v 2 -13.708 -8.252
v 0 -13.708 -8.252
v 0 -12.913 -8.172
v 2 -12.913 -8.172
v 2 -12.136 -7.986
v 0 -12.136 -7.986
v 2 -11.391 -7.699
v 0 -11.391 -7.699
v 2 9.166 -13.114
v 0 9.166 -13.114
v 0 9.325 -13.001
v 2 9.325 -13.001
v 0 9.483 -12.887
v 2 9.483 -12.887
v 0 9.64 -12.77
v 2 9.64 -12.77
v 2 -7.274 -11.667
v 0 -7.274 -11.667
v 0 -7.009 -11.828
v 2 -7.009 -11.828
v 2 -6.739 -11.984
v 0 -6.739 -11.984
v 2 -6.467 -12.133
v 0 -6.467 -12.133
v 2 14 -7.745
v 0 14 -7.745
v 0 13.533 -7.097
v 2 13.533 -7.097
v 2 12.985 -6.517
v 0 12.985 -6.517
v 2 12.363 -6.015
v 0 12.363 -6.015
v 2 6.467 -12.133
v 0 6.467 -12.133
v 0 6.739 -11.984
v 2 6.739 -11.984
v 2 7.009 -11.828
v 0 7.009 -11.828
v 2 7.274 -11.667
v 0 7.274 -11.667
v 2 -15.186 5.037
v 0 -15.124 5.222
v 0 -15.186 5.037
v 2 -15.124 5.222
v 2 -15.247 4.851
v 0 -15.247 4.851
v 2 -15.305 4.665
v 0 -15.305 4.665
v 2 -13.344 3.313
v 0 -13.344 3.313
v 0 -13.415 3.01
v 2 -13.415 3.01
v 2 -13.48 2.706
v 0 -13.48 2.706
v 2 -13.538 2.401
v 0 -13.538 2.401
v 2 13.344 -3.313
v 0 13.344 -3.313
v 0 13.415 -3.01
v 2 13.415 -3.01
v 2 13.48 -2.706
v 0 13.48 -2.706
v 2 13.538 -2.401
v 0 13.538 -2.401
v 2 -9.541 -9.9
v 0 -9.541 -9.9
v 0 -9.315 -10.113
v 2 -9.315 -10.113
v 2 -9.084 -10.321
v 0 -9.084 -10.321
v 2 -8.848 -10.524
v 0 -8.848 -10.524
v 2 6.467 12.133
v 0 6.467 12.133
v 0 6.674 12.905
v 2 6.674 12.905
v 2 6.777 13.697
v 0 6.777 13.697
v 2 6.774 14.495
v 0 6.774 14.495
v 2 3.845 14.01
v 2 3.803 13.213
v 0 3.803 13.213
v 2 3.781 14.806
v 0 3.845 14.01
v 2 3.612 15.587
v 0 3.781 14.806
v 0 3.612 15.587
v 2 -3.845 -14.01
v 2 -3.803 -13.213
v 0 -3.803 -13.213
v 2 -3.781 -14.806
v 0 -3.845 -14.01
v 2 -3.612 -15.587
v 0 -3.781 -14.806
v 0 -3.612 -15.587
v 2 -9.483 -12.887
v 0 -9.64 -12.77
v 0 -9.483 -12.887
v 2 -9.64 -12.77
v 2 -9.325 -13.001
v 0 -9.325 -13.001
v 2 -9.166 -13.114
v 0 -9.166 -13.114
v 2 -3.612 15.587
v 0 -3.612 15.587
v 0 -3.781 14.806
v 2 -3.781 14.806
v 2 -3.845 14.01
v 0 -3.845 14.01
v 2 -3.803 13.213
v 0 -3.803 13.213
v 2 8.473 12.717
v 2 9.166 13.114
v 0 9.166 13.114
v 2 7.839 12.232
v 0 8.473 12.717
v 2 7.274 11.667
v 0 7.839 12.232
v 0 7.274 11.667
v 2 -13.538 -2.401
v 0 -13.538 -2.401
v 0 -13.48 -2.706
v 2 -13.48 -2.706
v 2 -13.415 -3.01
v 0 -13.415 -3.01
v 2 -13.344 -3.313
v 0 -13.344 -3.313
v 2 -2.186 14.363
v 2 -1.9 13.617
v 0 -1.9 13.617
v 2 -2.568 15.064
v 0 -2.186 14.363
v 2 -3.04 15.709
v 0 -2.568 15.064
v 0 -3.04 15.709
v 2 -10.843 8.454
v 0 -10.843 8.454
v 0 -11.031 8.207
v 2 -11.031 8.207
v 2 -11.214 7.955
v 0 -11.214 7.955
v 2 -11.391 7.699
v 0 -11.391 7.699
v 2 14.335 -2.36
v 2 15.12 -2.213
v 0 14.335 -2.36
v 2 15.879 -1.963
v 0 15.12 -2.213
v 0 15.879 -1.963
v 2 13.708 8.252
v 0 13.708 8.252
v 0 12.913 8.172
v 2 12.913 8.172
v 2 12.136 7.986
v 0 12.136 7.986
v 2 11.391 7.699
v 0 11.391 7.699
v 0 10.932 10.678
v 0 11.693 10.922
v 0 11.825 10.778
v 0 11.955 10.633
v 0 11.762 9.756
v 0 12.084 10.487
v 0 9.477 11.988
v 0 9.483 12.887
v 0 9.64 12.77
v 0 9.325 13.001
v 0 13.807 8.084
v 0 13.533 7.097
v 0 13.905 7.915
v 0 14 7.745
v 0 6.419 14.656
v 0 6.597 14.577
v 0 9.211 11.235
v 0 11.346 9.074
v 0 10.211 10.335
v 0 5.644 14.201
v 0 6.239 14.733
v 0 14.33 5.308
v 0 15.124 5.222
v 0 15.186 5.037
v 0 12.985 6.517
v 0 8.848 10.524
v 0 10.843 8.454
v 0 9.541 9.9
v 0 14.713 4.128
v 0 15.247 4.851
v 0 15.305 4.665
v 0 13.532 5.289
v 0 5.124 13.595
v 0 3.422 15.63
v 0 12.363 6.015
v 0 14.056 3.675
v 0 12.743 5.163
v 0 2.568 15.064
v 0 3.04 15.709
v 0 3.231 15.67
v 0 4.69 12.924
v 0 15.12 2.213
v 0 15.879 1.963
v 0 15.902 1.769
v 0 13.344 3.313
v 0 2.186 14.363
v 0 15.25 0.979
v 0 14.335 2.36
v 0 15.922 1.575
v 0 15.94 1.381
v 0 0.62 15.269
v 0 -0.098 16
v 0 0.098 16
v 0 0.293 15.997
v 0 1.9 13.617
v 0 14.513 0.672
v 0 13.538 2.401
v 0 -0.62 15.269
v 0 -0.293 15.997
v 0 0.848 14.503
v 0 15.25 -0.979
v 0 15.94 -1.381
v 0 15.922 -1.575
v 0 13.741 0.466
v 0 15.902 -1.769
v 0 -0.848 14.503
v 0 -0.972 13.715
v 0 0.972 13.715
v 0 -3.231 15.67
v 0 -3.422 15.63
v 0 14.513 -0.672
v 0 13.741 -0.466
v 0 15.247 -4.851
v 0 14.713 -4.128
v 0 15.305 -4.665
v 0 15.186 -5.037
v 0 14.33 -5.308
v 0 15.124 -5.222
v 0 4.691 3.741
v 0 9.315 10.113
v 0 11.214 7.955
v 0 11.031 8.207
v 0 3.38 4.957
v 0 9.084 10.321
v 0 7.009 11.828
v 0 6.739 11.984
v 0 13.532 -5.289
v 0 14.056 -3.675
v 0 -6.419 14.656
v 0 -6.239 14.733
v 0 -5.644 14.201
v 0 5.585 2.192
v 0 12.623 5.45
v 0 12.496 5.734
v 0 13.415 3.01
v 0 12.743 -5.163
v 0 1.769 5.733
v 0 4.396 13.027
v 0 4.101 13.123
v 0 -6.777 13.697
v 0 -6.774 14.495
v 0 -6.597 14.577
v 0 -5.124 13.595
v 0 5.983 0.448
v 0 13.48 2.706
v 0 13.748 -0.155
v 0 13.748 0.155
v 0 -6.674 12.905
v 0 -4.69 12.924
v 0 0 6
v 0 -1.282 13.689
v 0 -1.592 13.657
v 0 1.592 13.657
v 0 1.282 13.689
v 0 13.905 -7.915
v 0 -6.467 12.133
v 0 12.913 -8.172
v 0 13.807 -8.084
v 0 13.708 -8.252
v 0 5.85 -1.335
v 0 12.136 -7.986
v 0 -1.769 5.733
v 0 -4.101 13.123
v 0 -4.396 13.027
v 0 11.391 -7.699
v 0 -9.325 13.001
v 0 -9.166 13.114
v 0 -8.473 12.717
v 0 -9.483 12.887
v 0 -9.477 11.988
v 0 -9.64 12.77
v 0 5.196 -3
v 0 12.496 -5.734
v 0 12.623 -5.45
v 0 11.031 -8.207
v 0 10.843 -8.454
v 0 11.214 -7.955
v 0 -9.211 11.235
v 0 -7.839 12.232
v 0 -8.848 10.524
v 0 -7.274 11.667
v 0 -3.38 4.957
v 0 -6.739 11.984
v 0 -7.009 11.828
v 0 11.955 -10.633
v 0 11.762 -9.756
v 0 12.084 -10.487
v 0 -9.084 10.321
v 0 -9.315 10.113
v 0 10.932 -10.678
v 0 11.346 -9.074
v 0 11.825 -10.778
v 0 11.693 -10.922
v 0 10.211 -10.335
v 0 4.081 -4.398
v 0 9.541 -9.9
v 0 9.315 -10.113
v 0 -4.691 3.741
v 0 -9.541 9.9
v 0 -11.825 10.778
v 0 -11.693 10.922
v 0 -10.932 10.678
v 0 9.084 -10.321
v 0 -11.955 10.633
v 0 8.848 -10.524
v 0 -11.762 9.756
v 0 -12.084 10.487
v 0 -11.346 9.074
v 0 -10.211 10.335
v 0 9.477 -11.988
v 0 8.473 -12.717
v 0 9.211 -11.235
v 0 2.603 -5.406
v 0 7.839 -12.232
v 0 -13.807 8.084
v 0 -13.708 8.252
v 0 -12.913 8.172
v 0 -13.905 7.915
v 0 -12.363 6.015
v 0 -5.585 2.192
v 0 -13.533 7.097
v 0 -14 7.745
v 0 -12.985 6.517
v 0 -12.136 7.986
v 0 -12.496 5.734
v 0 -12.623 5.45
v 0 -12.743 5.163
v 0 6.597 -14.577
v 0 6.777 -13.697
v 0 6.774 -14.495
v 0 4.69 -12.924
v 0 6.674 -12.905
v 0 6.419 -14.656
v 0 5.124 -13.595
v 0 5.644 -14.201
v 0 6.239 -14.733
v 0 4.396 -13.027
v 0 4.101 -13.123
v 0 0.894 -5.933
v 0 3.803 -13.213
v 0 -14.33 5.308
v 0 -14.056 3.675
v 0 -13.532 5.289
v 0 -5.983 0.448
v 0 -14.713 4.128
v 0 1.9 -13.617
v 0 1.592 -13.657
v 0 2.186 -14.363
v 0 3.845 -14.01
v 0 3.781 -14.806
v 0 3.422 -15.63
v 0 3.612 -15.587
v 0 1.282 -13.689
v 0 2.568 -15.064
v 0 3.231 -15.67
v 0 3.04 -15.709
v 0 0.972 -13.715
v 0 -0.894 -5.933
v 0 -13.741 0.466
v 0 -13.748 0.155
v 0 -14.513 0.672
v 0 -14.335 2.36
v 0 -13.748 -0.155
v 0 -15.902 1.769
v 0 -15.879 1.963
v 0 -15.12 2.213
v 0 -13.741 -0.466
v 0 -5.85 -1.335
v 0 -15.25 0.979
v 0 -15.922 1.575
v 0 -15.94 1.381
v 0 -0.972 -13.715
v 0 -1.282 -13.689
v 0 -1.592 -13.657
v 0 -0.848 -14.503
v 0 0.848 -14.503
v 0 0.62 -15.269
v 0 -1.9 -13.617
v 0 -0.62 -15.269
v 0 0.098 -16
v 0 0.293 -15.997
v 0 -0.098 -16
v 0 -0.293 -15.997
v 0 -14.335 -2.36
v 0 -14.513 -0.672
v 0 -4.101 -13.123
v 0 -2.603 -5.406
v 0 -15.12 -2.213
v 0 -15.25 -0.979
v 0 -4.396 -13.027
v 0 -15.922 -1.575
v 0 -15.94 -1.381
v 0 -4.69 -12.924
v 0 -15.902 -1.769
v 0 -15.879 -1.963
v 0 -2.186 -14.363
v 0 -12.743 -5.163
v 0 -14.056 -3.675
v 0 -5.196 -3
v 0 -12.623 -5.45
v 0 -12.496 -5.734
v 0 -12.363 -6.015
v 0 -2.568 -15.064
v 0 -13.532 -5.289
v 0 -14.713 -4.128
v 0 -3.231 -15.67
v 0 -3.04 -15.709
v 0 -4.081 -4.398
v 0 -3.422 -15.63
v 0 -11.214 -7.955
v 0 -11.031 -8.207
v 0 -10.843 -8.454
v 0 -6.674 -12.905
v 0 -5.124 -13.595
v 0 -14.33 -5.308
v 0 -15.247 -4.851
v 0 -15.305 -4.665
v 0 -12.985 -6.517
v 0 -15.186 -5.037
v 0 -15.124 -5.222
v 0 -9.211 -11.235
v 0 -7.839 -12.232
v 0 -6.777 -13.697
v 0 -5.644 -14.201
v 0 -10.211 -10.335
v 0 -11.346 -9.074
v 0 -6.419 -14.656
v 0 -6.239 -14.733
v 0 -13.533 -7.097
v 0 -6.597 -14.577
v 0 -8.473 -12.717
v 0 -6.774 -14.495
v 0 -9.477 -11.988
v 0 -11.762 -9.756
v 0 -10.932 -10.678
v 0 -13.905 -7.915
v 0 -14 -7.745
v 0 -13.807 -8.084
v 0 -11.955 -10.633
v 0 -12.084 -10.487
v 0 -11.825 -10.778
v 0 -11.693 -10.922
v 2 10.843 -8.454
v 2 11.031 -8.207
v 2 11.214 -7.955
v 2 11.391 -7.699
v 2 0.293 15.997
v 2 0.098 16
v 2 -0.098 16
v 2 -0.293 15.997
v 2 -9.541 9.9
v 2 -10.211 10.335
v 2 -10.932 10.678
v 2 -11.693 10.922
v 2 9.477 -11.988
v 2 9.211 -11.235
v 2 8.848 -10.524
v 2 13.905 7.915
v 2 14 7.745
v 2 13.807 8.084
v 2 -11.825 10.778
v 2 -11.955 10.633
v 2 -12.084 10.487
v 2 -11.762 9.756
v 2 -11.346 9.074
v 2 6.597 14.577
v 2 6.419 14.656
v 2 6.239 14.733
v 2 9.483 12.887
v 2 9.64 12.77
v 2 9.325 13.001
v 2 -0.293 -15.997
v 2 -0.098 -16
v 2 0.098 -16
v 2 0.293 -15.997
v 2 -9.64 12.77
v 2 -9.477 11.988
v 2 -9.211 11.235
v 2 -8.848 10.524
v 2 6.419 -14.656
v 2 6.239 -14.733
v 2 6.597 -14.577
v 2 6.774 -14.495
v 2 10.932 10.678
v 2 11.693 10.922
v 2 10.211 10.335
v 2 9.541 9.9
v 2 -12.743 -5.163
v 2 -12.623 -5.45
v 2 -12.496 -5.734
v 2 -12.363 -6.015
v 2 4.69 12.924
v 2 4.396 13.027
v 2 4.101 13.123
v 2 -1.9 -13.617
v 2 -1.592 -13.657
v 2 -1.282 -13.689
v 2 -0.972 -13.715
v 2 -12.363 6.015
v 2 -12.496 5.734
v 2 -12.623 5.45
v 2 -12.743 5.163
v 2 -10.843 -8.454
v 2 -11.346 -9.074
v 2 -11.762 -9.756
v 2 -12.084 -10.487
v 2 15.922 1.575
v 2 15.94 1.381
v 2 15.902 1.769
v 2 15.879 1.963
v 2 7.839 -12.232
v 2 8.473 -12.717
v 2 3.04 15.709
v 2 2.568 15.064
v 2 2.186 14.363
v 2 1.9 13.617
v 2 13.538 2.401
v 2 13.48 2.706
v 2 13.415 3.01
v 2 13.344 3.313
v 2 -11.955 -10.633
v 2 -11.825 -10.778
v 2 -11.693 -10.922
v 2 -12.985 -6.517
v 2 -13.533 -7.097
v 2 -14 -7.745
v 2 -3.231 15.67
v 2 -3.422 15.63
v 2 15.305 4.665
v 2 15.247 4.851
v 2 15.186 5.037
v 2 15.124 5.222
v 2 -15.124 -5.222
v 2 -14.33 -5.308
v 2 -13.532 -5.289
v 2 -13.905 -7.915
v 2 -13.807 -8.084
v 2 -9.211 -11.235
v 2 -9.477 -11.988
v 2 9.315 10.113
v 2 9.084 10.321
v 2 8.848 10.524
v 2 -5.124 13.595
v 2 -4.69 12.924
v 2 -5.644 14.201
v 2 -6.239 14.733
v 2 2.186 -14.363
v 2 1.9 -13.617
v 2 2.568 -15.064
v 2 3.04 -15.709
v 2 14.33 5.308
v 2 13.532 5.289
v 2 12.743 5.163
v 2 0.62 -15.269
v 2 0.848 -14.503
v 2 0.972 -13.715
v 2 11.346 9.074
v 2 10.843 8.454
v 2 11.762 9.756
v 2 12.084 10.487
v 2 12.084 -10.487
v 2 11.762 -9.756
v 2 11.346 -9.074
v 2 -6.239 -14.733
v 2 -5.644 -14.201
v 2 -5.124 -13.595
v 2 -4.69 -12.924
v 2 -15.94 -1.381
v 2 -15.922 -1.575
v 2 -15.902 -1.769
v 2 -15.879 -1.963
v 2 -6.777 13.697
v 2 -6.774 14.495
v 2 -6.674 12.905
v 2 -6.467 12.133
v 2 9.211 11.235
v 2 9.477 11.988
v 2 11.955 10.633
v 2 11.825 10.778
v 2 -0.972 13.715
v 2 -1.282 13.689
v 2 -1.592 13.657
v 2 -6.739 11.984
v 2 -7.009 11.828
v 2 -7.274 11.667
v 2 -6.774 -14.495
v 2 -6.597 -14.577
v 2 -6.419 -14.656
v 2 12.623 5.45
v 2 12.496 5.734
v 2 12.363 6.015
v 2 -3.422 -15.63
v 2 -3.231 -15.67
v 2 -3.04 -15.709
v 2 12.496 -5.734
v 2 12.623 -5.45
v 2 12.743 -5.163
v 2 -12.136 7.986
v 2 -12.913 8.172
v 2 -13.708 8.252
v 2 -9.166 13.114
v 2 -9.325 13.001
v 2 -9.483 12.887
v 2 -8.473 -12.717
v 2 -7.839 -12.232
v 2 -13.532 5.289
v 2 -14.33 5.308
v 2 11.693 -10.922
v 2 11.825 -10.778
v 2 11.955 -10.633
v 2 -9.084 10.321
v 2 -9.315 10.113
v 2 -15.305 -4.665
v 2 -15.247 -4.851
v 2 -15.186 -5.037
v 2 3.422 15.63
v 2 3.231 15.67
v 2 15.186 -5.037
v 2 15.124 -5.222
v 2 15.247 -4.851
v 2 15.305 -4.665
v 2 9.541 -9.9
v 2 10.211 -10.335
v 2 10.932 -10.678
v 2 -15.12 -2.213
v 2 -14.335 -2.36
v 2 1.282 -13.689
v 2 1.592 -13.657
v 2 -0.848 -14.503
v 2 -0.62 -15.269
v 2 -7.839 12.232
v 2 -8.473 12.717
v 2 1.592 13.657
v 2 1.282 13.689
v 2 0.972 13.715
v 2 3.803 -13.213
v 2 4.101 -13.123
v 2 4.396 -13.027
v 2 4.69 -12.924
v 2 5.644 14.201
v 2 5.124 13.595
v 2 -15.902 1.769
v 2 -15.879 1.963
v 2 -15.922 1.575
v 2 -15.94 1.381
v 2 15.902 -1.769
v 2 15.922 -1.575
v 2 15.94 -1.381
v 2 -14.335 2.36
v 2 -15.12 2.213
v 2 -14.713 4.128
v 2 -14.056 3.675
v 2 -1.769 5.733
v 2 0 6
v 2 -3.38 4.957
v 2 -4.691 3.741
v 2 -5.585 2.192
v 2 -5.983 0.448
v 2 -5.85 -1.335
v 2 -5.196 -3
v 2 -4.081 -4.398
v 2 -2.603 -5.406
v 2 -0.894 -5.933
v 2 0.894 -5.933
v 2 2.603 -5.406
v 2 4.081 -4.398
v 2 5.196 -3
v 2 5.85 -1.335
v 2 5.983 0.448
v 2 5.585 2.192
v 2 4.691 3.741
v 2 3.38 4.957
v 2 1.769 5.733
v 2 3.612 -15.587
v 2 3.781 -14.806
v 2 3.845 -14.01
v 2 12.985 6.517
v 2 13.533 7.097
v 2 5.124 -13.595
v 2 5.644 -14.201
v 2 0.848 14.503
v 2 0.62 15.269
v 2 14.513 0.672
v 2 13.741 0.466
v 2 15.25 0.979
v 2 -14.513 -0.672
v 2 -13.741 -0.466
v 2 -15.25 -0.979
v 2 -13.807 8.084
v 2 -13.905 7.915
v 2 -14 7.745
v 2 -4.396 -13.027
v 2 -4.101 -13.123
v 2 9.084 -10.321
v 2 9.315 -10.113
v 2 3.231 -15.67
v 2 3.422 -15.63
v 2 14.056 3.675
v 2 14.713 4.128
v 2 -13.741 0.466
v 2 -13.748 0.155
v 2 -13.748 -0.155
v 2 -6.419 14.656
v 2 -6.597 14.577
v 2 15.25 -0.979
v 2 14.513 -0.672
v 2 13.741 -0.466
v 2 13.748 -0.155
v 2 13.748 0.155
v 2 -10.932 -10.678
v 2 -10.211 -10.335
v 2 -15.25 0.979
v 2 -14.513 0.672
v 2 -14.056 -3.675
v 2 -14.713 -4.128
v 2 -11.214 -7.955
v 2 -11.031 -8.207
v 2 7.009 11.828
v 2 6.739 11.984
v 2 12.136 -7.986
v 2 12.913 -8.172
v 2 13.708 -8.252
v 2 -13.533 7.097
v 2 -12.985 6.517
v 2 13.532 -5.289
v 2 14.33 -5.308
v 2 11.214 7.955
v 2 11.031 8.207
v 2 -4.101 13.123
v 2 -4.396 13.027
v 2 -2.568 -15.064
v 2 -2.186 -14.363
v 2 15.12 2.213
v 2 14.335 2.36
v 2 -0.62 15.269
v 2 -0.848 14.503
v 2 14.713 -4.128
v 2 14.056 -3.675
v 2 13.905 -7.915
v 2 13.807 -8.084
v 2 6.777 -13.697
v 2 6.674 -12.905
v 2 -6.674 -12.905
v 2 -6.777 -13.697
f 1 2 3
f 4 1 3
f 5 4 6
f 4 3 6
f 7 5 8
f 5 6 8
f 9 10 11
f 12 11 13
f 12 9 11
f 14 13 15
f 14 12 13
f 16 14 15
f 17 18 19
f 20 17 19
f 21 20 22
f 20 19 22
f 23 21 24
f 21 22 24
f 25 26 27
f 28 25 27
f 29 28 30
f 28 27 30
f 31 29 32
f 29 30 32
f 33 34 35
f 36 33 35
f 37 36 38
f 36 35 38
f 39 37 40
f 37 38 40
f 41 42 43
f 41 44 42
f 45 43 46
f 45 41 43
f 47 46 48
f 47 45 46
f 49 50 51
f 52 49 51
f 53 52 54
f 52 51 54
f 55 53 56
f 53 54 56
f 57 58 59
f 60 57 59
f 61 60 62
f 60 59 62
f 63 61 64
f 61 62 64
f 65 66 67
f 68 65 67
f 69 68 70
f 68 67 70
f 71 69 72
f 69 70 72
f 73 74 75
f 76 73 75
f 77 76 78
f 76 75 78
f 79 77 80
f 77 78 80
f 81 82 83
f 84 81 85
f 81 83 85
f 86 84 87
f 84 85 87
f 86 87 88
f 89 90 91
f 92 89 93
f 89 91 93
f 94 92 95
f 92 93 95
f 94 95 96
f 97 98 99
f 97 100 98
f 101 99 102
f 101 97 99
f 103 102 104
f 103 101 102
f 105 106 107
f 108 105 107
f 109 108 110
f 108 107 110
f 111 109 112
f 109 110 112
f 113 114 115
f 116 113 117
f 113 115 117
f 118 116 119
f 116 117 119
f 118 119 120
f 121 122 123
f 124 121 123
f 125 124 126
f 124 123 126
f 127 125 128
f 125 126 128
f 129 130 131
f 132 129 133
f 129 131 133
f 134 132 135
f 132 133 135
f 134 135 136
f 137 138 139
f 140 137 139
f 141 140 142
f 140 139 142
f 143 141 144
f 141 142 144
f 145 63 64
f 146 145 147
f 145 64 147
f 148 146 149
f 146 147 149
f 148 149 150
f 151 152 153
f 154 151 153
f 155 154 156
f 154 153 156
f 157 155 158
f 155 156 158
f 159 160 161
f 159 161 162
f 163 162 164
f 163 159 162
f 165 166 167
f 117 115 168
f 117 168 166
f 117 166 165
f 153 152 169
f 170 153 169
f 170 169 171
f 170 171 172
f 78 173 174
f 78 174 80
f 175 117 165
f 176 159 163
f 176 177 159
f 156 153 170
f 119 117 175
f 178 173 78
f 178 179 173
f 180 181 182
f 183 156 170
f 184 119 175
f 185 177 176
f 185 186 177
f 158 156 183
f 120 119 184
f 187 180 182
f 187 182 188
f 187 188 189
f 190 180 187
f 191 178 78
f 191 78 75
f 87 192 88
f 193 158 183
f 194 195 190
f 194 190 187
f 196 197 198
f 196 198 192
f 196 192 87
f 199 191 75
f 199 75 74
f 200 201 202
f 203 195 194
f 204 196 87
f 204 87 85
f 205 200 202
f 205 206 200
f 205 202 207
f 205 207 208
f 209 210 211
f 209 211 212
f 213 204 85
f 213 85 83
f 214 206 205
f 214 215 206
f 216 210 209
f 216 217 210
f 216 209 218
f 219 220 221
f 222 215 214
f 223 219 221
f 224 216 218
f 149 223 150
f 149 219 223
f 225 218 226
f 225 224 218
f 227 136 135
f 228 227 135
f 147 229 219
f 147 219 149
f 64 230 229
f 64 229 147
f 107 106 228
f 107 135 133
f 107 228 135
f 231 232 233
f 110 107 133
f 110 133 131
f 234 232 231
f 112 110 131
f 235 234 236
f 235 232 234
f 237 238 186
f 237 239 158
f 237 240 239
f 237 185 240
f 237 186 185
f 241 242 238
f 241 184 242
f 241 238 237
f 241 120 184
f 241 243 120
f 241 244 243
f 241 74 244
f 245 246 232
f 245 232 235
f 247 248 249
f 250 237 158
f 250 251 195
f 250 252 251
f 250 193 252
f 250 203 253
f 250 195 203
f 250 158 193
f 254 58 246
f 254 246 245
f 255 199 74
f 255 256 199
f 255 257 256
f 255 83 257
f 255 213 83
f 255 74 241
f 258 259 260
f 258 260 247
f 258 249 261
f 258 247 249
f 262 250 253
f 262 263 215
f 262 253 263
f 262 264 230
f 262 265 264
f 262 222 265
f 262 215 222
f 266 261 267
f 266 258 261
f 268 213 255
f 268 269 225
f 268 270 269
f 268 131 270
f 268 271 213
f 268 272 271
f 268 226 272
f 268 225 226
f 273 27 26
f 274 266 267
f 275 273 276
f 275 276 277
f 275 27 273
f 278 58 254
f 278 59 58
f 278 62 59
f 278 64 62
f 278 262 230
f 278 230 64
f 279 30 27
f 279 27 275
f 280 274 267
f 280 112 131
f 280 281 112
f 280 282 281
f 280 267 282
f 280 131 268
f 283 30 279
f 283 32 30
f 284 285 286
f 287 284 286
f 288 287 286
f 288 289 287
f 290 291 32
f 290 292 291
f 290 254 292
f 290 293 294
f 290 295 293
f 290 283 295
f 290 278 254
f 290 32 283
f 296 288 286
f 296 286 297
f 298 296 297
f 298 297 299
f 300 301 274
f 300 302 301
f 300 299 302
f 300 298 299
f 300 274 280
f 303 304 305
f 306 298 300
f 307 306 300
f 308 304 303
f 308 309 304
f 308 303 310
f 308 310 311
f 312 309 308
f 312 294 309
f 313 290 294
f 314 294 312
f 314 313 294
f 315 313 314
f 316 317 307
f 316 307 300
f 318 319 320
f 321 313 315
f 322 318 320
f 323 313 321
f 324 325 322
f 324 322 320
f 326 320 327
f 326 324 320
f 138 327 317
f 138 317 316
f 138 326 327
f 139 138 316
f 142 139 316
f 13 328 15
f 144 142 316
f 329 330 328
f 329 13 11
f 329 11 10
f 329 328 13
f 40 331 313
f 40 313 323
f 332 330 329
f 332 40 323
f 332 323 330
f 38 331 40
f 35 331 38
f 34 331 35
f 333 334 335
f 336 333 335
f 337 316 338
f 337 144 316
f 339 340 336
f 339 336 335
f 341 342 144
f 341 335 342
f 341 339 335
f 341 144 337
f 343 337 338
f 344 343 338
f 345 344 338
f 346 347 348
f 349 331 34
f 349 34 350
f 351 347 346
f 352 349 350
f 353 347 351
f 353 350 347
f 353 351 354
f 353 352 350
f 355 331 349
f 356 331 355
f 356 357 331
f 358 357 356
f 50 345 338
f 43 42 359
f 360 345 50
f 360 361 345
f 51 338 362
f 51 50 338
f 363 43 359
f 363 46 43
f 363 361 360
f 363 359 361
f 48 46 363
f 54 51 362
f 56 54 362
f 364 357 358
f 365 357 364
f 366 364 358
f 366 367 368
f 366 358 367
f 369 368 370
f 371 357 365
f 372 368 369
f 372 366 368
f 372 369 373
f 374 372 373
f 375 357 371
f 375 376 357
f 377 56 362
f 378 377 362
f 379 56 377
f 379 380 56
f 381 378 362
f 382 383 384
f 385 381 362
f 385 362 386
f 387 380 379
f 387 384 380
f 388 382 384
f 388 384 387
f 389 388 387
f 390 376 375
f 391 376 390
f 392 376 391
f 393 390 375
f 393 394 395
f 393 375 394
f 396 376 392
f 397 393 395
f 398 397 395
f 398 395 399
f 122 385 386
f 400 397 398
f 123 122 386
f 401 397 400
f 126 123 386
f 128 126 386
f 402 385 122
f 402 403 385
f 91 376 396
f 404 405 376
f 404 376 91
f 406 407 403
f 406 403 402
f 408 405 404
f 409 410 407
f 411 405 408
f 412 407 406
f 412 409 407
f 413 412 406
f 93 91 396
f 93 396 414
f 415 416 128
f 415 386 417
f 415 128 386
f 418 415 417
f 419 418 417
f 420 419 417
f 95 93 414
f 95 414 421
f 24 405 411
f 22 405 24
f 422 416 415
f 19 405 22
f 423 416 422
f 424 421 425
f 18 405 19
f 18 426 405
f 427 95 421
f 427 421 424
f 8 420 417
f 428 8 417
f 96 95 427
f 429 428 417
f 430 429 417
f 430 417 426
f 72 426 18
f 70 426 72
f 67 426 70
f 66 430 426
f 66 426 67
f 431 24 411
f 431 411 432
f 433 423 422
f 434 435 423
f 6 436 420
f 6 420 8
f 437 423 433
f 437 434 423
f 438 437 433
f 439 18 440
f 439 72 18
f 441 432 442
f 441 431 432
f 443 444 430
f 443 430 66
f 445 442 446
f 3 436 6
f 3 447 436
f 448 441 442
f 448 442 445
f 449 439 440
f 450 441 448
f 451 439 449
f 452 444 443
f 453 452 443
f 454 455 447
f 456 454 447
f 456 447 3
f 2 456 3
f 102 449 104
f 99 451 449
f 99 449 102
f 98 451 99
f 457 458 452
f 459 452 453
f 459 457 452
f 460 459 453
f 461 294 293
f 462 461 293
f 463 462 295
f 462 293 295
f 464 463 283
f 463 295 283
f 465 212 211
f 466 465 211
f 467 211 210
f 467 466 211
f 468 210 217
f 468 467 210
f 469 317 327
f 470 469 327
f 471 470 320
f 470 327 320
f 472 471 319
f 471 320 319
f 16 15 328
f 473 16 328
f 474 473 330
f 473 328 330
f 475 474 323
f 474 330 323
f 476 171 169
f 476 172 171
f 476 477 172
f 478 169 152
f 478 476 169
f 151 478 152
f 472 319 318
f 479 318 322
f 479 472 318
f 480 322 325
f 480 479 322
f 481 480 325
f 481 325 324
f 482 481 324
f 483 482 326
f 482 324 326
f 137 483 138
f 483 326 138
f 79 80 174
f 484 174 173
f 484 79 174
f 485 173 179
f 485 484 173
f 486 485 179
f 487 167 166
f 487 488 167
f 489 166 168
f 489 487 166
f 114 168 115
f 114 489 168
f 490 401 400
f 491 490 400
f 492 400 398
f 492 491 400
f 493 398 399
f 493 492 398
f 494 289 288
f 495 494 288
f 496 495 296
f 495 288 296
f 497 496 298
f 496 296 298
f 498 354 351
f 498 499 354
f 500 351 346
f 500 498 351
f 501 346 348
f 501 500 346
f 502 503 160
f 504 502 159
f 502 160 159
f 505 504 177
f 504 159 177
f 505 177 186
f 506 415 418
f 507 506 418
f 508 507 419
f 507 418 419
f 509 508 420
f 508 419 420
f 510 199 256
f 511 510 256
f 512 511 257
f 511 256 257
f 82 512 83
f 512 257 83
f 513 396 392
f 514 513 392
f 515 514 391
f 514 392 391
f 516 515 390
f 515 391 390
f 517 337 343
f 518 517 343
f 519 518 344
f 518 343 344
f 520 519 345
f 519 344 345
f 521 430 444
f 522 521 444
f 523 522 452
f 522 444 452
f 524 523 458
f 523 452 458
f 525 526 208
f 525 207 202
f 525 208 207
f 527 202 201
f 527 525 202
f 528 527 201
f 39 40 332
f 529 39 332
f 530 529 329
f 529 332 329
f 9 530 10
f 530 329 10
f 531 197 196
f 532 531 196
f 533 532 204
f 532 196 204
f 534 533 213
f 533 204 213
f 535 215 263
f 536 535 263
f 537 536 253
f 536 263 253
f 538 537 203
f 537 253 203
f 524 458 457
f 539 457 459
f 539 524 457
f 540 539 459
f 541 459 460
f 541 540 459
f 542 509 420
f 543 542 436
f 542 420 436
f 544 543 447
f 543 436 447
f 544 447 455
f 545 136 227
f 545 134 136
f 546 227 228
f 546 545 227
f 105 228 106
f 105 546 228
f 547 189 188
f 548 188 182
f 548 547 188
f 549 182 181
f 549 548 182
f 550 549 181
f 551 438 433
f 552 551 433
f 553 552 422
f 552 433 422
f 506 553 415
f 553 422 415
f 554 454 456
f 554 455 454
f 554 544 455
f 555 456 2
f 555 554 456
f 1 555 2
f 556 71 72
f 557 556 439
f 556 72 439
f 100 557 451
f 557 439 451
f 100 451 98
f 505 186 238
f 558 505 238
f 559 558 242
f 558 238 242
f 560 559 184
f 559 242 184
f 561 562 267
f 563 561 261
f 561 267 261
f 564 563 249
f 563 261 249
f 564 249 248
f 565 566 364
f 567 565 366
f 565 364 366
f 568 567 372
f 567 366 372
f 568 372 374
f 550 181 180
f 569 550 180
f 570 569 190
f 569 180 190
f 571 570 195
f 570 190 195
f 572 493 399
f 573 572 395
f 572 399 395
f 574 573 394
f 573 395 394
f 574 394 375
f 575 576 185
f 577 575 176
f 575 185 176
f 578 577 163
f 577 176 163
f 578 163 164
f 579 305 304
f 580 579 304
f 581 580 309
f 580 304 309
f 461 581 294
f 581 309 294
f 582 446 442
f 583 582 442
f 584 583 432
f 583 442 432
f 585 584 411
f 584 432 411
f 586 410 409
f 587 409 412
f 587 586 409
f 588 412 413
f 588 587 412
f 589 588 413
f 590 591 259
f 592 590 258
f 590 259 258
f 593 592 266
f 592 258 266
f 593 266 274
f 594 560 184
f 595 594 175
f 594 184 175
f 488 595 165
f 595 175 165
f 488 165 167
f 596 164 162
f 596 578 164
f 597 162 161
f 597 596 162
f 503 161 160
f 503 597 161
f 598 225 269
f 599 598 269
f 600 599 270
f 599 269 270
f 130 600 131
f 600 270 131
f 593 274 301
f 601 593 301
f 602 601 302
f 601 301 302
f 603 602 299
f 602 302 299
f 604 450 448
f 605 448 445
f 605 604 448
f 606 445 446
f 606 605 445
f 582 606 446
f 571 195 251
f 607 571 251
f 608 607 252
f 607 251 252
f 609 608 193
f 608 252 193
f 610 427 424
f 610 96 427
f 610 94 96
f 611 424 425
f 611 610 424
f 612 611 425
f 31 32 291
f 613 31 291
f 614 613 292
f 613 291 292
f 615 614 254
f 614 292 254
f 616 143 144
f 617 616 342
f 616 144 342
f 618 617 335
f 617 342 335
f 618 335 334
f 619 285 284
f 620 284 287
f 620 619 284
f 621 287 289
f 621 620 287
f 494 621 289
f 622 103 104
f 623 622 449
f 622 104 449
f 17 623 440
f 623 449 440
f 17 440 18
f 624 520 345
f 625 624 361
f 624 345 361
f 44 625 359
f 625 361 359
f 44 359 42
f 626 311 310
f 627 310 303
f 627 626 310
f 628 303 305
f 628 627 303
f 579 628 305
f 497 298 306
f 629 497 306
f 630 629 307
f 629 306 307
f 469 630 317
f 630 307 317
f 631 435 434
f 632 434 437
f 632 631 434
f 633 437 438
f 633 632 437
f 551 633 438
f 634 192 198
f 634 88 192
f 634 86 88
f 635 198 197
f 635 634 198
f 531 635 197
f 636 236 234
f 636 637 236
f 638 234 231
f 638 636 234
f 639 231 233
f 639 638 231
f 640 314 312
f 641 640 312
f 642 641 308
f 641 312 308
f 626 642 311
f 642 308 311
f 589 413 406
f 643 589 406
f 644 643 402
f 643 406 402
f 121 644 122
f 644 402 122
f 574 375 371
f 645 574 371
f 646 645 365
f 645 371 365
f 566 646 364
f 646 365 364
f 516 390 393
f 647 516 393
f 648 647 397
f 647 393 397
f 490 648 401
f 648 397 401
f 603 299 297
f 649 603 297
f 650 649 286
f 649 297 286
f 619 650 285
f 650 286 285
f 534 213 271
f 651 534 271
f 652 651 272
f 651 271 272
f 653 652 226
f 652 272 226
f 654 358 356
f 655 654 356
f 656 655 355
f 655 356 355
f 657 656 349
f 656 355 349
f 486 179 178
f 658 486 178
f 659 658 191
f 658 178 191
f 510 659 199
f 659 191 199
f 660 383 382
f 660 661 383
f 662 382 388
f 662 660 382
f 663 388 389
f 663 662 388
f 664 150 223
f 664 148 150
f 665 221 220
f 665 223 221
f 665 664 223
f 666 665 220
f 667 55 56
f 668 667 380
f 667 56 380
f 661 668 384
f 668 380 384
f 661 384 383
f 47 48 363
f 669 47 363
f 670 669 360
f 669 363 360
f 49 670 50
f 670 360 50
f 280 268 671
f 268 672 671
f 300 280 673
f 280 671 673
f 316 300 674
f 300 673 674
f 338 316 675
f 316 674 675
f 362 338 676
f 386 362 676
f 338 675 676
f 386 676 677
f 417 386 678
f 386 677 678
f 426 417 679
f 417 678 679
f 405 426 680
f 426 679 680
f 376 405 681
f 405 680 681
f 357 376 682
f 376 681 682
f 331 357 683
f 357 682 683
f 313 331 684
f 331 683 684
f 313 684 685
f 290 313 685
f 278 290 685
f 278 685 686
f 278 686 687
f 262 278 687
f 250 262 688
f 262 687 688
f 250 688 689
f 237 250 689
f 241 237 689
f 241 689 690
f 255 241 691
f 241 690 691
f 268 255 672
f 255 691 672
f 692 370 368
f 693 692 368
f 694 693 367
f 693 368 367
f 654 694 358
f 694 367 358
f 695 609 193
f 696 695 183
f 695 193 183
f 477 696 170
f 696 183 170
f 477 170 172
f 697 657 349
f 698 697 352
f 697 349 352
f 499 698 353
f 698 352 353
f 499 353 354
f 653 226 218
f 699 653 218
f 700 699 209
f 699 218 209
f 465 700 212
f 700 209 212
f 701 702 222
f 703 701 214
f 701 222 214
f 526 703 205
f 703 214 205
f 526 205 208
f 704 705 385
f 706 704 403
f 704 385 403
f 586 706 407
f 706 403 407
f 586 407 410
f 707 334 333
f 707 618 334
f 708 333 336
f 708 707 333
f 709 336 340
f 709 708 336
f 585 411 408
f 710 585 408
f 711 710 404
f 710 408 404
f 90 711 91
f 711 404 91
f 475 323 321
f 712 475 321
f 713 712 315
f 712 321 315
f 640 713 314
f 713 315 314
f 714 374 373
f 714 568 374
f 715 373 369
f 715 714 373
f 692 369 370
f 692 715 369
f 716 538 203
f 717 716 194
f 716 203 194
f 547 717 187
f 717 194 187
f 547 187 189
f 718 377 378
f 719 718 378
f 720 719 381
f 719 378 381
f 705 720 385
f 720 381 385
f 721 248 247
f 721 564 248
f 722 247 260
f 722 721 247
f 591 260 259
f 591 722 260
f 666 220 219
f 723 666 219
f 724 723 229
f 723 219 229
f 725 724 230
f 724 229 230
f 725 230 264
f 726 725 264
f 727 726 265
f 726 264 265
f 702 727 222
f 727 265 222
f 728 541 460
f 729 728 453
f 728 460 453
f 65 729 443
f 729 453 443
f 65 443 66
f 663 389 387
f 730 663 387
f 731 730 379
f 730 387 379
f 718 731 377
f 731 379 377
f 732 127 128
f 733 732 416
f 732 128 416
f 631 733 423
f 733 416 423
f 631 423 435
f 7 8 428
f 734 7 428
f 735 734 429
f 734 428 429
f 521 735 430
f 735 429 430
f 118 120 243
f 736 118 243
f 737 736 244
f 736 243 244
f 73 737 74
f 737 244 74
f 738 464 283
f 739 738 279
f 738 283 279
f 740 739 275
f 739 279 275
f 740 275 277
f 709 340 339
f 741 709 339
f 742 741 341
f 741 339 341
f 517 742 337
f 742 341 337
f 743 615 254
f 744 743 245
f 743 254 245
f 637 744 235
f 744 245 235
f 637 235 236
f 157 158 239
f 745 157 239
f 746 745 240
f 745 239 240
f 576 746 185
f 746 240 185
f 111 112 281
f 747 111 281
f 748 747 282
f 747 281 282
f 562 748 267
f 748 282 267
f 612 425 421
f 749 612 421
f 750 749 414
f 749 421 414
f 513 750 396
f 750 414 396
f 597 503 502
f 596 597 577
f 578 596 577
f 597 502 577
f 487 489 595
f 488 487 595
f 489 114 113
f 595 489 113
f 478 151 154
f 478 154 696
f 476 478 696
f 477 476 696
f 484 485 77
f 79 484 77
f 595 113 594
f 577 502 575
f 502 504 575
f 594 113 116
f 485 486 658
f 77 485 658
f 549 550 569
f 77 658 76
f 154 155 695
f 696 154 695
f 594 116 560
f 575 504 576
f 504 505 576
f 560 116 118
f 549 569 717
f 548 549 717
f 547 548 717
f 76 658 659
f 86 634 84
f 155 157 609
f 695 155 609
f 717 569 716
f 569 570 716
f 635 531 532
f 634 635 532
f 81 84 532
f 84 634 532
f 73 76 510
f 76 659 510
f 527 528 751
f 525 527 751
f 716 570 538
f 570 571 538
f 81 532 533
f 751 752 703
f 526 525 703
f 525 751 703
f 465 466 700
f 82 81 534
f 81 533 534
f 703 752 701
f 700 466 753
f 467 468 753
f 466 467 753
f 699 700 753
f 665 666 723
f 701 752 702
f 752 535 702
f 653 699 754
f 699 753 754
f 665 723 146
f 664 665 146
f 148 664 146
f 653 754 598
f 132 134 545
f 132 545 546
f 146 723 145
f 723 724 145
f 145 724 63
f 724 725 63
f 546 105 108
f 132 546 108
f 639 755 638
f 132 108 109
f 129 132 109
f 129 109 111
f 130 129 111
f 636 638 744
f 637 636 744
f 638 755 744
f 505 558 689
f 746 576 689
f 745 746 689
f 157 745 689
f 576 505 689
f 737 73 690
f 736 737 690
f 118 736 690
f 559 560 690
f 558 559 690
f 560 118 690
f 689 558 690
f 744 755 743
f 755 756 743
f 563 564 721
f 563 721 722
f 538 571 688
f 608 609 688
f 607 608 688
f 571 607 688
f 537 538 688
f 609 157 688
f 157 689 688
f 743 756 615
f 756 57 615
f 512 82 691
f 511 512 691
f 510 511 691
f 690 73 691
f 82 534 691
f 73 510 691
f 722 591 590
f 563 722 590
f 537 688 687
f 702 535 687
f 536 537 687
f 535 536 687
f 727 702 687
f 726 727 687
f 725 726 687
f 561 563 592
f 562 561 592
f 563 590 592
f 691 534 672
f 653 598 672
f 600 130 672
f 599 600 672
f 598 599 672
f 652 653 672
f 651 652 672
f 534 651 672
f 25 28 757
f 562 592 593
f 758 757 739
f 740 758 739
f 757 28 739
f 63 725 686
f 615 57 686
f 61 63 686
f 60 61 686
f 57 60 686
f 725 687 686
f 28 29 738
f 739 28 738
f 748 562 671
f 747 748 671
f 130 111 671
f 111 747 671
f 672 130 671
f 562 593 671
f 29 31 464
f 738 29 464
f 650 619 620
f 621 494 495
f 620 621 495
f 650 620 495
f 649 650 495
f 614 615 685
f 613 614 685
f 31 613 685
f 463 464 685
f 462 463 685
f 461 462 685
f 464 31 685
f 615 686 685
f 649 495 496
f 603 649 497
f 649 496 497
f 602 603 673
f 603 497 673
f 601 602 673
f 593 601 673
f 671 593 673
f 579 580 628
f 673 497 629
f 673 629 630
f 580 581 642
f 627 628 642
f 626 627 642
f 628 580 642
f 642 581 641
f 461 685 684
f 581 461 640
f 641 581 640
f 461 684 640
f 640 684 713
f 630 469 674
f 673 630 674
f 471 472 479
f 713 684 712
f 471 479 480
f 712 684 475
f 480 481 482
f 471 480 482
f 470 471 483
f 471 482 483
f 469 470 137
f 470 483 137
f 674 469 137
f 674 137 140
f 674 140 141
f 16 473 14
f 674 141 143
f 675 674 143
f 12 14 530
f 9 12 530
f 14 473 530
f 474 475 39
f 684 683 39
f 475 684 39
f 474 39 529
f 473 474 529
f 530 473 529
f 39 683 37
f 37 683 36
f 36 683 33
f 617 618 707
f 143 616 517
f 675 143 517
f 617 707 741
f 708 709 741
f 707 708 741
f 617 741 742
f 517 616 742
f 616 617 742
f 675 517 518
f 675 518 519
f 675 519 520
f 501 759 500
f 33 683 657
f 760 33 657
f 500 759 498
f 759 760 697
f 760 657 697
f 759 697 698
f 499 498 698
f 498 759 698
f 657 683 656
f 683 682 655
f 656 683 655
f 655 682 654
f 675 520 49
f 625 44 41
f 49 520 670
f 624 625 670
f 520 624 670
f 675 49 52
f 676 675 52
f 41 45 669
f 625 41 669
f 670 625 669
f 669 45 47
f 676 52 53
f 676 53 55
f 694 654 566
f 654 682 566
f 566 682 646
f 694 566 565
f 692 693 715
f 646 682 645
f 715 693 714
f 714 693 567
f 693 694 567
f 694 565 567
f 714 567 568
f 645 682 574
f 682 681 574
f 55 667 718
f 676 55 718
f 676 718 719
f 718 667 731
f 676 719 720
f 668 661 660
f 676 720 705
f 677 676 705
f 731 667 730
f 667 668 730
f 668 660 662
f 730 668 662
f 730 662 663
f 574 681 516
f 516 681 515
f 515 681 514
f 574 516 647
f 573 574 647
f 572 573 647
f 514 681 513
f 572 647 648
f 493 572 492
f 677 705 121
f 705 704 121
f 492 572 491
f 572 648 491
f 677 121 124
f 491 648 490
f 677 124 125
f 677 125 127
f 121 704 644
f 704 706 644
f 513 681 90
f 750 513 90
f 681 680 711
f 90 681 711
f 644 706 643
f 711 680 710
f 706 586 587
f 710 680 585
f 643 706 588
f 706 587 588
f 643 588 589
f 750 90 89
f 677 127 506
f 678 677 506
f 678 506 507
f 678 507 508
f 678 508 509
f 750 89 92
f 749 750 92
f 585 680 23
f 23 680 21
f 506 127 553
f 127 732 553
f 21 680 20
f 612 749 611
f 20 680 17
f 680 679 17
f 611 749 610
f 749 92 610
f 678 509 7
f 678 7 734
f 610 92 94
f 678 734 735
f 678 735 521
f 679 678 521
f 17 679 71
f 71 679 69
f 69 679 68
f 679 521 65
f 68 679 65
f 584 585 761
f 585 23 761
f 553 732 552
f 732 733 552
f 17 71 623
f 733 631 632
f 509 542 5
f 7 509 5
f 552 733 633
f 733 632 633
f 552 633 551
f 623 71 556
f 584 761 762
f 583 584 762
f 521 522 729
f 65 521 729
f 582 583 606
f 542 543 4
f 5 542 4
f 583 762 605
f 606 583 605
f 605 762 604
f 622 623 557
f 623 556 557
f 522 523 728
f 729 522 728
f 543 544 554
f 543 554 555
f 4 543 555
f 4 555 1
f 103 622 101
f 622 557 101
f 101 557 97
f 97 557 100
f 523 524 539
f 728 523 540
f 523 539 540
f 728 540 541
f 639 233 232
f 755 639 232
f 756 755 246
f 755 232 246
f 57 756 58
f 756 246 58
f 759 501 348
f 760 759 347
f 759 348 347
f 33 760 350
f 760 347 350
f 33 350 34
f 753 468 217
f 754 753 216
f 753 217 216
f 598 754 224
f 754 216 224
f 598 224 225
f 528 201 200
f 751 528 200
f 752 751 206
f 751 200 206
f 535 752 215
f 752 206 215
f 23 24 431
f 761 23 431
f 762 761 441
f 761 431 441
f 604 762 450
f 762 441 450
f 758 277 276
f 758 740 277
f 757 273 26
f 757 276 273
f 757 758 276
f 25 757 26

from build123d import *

# Parameters (mm, degrees)
BASPROSKE_W     = 2
BASPROSKE_H     = 16
TOOTHCUT_DEPTH  = 23.715633383
TEETHCUTS_COUNT = 30
BORSKE_R        = 6
BORE_DEPTH      = 50.0000508


with BuildPart() as part:
    # BasProSke → Base-Revolve (revolve)
    with BuildSketch(Plane(origin=(0, 0, 0), x_dir=(1, 0, 0), z_dir=(0, 1, 0)), mode=Mode.PRIVATE) as base_revolve_sk:
        with Locations((1, 8)):
            Rectangle(BASPROSKE_W, BASPROSKE_H)
    revolve(base_revolve_sk.sketch.rotate(Axis((-10, 0, 0), (1, 0, 0)), 180), axis=Axis((-10, 0, 0), (1, 0, 0)))

    # TooCutSke → ToothCut (cut, through all)
    with BuildSketch(Plane(origin=(0, 0, 0), x_dir=(0, 0, -1), z_dir=(1, 0, 0))):
        with BuildLine():
            ThreePointArc((0.466400716, 13.741086979), (0, 13.749), (-0.466400716, 13.741086979))
            ThreePointArc((-0.466400716, 13.741086979), (-0.819142092, 14.899954875), (-1.3974676, 15.964351834))
            ThreePointArc((-1.3974676, 15.964351834), (0, 16.0254), (1.3974676, 15.964351834))
            ThreePointArc((1.3974676, 15.964351834), (0.819142092, 14.899954875), (0.466400716, 13.741086979))
        make_face()
    toothcut = extrude(amount=TOOTHCUT_DEPTH, mode=Mode.SUBTRACT)

    # TeethCuts: ToothCut ×30 about axis
    teethcuts_axis = Axis((0, 0, 0), (1, 0, 0))
    for i in range(1, TEETHCUTS_COUNT):
        add(toothcut.rotate(teethcuts_axis, i * 360 / TEETHCUTS_COUNT), mode=Mode.SUBTRACT)

    # BorSke → Bore (cut, symmetric)
    with BuildSketch(Plane(origin=(0, 0, 0), x_dir=(0, 0, -1), z_dir=(1, 0, 0))):
        with Locations(Location((0, 0, 0), (0, 0, 180))):
            Circle(BORSKE_R)
    extrude(amount=BORE_DEPTH, both=True, mode=Mode.SUBTRACT)


solid = part.part
